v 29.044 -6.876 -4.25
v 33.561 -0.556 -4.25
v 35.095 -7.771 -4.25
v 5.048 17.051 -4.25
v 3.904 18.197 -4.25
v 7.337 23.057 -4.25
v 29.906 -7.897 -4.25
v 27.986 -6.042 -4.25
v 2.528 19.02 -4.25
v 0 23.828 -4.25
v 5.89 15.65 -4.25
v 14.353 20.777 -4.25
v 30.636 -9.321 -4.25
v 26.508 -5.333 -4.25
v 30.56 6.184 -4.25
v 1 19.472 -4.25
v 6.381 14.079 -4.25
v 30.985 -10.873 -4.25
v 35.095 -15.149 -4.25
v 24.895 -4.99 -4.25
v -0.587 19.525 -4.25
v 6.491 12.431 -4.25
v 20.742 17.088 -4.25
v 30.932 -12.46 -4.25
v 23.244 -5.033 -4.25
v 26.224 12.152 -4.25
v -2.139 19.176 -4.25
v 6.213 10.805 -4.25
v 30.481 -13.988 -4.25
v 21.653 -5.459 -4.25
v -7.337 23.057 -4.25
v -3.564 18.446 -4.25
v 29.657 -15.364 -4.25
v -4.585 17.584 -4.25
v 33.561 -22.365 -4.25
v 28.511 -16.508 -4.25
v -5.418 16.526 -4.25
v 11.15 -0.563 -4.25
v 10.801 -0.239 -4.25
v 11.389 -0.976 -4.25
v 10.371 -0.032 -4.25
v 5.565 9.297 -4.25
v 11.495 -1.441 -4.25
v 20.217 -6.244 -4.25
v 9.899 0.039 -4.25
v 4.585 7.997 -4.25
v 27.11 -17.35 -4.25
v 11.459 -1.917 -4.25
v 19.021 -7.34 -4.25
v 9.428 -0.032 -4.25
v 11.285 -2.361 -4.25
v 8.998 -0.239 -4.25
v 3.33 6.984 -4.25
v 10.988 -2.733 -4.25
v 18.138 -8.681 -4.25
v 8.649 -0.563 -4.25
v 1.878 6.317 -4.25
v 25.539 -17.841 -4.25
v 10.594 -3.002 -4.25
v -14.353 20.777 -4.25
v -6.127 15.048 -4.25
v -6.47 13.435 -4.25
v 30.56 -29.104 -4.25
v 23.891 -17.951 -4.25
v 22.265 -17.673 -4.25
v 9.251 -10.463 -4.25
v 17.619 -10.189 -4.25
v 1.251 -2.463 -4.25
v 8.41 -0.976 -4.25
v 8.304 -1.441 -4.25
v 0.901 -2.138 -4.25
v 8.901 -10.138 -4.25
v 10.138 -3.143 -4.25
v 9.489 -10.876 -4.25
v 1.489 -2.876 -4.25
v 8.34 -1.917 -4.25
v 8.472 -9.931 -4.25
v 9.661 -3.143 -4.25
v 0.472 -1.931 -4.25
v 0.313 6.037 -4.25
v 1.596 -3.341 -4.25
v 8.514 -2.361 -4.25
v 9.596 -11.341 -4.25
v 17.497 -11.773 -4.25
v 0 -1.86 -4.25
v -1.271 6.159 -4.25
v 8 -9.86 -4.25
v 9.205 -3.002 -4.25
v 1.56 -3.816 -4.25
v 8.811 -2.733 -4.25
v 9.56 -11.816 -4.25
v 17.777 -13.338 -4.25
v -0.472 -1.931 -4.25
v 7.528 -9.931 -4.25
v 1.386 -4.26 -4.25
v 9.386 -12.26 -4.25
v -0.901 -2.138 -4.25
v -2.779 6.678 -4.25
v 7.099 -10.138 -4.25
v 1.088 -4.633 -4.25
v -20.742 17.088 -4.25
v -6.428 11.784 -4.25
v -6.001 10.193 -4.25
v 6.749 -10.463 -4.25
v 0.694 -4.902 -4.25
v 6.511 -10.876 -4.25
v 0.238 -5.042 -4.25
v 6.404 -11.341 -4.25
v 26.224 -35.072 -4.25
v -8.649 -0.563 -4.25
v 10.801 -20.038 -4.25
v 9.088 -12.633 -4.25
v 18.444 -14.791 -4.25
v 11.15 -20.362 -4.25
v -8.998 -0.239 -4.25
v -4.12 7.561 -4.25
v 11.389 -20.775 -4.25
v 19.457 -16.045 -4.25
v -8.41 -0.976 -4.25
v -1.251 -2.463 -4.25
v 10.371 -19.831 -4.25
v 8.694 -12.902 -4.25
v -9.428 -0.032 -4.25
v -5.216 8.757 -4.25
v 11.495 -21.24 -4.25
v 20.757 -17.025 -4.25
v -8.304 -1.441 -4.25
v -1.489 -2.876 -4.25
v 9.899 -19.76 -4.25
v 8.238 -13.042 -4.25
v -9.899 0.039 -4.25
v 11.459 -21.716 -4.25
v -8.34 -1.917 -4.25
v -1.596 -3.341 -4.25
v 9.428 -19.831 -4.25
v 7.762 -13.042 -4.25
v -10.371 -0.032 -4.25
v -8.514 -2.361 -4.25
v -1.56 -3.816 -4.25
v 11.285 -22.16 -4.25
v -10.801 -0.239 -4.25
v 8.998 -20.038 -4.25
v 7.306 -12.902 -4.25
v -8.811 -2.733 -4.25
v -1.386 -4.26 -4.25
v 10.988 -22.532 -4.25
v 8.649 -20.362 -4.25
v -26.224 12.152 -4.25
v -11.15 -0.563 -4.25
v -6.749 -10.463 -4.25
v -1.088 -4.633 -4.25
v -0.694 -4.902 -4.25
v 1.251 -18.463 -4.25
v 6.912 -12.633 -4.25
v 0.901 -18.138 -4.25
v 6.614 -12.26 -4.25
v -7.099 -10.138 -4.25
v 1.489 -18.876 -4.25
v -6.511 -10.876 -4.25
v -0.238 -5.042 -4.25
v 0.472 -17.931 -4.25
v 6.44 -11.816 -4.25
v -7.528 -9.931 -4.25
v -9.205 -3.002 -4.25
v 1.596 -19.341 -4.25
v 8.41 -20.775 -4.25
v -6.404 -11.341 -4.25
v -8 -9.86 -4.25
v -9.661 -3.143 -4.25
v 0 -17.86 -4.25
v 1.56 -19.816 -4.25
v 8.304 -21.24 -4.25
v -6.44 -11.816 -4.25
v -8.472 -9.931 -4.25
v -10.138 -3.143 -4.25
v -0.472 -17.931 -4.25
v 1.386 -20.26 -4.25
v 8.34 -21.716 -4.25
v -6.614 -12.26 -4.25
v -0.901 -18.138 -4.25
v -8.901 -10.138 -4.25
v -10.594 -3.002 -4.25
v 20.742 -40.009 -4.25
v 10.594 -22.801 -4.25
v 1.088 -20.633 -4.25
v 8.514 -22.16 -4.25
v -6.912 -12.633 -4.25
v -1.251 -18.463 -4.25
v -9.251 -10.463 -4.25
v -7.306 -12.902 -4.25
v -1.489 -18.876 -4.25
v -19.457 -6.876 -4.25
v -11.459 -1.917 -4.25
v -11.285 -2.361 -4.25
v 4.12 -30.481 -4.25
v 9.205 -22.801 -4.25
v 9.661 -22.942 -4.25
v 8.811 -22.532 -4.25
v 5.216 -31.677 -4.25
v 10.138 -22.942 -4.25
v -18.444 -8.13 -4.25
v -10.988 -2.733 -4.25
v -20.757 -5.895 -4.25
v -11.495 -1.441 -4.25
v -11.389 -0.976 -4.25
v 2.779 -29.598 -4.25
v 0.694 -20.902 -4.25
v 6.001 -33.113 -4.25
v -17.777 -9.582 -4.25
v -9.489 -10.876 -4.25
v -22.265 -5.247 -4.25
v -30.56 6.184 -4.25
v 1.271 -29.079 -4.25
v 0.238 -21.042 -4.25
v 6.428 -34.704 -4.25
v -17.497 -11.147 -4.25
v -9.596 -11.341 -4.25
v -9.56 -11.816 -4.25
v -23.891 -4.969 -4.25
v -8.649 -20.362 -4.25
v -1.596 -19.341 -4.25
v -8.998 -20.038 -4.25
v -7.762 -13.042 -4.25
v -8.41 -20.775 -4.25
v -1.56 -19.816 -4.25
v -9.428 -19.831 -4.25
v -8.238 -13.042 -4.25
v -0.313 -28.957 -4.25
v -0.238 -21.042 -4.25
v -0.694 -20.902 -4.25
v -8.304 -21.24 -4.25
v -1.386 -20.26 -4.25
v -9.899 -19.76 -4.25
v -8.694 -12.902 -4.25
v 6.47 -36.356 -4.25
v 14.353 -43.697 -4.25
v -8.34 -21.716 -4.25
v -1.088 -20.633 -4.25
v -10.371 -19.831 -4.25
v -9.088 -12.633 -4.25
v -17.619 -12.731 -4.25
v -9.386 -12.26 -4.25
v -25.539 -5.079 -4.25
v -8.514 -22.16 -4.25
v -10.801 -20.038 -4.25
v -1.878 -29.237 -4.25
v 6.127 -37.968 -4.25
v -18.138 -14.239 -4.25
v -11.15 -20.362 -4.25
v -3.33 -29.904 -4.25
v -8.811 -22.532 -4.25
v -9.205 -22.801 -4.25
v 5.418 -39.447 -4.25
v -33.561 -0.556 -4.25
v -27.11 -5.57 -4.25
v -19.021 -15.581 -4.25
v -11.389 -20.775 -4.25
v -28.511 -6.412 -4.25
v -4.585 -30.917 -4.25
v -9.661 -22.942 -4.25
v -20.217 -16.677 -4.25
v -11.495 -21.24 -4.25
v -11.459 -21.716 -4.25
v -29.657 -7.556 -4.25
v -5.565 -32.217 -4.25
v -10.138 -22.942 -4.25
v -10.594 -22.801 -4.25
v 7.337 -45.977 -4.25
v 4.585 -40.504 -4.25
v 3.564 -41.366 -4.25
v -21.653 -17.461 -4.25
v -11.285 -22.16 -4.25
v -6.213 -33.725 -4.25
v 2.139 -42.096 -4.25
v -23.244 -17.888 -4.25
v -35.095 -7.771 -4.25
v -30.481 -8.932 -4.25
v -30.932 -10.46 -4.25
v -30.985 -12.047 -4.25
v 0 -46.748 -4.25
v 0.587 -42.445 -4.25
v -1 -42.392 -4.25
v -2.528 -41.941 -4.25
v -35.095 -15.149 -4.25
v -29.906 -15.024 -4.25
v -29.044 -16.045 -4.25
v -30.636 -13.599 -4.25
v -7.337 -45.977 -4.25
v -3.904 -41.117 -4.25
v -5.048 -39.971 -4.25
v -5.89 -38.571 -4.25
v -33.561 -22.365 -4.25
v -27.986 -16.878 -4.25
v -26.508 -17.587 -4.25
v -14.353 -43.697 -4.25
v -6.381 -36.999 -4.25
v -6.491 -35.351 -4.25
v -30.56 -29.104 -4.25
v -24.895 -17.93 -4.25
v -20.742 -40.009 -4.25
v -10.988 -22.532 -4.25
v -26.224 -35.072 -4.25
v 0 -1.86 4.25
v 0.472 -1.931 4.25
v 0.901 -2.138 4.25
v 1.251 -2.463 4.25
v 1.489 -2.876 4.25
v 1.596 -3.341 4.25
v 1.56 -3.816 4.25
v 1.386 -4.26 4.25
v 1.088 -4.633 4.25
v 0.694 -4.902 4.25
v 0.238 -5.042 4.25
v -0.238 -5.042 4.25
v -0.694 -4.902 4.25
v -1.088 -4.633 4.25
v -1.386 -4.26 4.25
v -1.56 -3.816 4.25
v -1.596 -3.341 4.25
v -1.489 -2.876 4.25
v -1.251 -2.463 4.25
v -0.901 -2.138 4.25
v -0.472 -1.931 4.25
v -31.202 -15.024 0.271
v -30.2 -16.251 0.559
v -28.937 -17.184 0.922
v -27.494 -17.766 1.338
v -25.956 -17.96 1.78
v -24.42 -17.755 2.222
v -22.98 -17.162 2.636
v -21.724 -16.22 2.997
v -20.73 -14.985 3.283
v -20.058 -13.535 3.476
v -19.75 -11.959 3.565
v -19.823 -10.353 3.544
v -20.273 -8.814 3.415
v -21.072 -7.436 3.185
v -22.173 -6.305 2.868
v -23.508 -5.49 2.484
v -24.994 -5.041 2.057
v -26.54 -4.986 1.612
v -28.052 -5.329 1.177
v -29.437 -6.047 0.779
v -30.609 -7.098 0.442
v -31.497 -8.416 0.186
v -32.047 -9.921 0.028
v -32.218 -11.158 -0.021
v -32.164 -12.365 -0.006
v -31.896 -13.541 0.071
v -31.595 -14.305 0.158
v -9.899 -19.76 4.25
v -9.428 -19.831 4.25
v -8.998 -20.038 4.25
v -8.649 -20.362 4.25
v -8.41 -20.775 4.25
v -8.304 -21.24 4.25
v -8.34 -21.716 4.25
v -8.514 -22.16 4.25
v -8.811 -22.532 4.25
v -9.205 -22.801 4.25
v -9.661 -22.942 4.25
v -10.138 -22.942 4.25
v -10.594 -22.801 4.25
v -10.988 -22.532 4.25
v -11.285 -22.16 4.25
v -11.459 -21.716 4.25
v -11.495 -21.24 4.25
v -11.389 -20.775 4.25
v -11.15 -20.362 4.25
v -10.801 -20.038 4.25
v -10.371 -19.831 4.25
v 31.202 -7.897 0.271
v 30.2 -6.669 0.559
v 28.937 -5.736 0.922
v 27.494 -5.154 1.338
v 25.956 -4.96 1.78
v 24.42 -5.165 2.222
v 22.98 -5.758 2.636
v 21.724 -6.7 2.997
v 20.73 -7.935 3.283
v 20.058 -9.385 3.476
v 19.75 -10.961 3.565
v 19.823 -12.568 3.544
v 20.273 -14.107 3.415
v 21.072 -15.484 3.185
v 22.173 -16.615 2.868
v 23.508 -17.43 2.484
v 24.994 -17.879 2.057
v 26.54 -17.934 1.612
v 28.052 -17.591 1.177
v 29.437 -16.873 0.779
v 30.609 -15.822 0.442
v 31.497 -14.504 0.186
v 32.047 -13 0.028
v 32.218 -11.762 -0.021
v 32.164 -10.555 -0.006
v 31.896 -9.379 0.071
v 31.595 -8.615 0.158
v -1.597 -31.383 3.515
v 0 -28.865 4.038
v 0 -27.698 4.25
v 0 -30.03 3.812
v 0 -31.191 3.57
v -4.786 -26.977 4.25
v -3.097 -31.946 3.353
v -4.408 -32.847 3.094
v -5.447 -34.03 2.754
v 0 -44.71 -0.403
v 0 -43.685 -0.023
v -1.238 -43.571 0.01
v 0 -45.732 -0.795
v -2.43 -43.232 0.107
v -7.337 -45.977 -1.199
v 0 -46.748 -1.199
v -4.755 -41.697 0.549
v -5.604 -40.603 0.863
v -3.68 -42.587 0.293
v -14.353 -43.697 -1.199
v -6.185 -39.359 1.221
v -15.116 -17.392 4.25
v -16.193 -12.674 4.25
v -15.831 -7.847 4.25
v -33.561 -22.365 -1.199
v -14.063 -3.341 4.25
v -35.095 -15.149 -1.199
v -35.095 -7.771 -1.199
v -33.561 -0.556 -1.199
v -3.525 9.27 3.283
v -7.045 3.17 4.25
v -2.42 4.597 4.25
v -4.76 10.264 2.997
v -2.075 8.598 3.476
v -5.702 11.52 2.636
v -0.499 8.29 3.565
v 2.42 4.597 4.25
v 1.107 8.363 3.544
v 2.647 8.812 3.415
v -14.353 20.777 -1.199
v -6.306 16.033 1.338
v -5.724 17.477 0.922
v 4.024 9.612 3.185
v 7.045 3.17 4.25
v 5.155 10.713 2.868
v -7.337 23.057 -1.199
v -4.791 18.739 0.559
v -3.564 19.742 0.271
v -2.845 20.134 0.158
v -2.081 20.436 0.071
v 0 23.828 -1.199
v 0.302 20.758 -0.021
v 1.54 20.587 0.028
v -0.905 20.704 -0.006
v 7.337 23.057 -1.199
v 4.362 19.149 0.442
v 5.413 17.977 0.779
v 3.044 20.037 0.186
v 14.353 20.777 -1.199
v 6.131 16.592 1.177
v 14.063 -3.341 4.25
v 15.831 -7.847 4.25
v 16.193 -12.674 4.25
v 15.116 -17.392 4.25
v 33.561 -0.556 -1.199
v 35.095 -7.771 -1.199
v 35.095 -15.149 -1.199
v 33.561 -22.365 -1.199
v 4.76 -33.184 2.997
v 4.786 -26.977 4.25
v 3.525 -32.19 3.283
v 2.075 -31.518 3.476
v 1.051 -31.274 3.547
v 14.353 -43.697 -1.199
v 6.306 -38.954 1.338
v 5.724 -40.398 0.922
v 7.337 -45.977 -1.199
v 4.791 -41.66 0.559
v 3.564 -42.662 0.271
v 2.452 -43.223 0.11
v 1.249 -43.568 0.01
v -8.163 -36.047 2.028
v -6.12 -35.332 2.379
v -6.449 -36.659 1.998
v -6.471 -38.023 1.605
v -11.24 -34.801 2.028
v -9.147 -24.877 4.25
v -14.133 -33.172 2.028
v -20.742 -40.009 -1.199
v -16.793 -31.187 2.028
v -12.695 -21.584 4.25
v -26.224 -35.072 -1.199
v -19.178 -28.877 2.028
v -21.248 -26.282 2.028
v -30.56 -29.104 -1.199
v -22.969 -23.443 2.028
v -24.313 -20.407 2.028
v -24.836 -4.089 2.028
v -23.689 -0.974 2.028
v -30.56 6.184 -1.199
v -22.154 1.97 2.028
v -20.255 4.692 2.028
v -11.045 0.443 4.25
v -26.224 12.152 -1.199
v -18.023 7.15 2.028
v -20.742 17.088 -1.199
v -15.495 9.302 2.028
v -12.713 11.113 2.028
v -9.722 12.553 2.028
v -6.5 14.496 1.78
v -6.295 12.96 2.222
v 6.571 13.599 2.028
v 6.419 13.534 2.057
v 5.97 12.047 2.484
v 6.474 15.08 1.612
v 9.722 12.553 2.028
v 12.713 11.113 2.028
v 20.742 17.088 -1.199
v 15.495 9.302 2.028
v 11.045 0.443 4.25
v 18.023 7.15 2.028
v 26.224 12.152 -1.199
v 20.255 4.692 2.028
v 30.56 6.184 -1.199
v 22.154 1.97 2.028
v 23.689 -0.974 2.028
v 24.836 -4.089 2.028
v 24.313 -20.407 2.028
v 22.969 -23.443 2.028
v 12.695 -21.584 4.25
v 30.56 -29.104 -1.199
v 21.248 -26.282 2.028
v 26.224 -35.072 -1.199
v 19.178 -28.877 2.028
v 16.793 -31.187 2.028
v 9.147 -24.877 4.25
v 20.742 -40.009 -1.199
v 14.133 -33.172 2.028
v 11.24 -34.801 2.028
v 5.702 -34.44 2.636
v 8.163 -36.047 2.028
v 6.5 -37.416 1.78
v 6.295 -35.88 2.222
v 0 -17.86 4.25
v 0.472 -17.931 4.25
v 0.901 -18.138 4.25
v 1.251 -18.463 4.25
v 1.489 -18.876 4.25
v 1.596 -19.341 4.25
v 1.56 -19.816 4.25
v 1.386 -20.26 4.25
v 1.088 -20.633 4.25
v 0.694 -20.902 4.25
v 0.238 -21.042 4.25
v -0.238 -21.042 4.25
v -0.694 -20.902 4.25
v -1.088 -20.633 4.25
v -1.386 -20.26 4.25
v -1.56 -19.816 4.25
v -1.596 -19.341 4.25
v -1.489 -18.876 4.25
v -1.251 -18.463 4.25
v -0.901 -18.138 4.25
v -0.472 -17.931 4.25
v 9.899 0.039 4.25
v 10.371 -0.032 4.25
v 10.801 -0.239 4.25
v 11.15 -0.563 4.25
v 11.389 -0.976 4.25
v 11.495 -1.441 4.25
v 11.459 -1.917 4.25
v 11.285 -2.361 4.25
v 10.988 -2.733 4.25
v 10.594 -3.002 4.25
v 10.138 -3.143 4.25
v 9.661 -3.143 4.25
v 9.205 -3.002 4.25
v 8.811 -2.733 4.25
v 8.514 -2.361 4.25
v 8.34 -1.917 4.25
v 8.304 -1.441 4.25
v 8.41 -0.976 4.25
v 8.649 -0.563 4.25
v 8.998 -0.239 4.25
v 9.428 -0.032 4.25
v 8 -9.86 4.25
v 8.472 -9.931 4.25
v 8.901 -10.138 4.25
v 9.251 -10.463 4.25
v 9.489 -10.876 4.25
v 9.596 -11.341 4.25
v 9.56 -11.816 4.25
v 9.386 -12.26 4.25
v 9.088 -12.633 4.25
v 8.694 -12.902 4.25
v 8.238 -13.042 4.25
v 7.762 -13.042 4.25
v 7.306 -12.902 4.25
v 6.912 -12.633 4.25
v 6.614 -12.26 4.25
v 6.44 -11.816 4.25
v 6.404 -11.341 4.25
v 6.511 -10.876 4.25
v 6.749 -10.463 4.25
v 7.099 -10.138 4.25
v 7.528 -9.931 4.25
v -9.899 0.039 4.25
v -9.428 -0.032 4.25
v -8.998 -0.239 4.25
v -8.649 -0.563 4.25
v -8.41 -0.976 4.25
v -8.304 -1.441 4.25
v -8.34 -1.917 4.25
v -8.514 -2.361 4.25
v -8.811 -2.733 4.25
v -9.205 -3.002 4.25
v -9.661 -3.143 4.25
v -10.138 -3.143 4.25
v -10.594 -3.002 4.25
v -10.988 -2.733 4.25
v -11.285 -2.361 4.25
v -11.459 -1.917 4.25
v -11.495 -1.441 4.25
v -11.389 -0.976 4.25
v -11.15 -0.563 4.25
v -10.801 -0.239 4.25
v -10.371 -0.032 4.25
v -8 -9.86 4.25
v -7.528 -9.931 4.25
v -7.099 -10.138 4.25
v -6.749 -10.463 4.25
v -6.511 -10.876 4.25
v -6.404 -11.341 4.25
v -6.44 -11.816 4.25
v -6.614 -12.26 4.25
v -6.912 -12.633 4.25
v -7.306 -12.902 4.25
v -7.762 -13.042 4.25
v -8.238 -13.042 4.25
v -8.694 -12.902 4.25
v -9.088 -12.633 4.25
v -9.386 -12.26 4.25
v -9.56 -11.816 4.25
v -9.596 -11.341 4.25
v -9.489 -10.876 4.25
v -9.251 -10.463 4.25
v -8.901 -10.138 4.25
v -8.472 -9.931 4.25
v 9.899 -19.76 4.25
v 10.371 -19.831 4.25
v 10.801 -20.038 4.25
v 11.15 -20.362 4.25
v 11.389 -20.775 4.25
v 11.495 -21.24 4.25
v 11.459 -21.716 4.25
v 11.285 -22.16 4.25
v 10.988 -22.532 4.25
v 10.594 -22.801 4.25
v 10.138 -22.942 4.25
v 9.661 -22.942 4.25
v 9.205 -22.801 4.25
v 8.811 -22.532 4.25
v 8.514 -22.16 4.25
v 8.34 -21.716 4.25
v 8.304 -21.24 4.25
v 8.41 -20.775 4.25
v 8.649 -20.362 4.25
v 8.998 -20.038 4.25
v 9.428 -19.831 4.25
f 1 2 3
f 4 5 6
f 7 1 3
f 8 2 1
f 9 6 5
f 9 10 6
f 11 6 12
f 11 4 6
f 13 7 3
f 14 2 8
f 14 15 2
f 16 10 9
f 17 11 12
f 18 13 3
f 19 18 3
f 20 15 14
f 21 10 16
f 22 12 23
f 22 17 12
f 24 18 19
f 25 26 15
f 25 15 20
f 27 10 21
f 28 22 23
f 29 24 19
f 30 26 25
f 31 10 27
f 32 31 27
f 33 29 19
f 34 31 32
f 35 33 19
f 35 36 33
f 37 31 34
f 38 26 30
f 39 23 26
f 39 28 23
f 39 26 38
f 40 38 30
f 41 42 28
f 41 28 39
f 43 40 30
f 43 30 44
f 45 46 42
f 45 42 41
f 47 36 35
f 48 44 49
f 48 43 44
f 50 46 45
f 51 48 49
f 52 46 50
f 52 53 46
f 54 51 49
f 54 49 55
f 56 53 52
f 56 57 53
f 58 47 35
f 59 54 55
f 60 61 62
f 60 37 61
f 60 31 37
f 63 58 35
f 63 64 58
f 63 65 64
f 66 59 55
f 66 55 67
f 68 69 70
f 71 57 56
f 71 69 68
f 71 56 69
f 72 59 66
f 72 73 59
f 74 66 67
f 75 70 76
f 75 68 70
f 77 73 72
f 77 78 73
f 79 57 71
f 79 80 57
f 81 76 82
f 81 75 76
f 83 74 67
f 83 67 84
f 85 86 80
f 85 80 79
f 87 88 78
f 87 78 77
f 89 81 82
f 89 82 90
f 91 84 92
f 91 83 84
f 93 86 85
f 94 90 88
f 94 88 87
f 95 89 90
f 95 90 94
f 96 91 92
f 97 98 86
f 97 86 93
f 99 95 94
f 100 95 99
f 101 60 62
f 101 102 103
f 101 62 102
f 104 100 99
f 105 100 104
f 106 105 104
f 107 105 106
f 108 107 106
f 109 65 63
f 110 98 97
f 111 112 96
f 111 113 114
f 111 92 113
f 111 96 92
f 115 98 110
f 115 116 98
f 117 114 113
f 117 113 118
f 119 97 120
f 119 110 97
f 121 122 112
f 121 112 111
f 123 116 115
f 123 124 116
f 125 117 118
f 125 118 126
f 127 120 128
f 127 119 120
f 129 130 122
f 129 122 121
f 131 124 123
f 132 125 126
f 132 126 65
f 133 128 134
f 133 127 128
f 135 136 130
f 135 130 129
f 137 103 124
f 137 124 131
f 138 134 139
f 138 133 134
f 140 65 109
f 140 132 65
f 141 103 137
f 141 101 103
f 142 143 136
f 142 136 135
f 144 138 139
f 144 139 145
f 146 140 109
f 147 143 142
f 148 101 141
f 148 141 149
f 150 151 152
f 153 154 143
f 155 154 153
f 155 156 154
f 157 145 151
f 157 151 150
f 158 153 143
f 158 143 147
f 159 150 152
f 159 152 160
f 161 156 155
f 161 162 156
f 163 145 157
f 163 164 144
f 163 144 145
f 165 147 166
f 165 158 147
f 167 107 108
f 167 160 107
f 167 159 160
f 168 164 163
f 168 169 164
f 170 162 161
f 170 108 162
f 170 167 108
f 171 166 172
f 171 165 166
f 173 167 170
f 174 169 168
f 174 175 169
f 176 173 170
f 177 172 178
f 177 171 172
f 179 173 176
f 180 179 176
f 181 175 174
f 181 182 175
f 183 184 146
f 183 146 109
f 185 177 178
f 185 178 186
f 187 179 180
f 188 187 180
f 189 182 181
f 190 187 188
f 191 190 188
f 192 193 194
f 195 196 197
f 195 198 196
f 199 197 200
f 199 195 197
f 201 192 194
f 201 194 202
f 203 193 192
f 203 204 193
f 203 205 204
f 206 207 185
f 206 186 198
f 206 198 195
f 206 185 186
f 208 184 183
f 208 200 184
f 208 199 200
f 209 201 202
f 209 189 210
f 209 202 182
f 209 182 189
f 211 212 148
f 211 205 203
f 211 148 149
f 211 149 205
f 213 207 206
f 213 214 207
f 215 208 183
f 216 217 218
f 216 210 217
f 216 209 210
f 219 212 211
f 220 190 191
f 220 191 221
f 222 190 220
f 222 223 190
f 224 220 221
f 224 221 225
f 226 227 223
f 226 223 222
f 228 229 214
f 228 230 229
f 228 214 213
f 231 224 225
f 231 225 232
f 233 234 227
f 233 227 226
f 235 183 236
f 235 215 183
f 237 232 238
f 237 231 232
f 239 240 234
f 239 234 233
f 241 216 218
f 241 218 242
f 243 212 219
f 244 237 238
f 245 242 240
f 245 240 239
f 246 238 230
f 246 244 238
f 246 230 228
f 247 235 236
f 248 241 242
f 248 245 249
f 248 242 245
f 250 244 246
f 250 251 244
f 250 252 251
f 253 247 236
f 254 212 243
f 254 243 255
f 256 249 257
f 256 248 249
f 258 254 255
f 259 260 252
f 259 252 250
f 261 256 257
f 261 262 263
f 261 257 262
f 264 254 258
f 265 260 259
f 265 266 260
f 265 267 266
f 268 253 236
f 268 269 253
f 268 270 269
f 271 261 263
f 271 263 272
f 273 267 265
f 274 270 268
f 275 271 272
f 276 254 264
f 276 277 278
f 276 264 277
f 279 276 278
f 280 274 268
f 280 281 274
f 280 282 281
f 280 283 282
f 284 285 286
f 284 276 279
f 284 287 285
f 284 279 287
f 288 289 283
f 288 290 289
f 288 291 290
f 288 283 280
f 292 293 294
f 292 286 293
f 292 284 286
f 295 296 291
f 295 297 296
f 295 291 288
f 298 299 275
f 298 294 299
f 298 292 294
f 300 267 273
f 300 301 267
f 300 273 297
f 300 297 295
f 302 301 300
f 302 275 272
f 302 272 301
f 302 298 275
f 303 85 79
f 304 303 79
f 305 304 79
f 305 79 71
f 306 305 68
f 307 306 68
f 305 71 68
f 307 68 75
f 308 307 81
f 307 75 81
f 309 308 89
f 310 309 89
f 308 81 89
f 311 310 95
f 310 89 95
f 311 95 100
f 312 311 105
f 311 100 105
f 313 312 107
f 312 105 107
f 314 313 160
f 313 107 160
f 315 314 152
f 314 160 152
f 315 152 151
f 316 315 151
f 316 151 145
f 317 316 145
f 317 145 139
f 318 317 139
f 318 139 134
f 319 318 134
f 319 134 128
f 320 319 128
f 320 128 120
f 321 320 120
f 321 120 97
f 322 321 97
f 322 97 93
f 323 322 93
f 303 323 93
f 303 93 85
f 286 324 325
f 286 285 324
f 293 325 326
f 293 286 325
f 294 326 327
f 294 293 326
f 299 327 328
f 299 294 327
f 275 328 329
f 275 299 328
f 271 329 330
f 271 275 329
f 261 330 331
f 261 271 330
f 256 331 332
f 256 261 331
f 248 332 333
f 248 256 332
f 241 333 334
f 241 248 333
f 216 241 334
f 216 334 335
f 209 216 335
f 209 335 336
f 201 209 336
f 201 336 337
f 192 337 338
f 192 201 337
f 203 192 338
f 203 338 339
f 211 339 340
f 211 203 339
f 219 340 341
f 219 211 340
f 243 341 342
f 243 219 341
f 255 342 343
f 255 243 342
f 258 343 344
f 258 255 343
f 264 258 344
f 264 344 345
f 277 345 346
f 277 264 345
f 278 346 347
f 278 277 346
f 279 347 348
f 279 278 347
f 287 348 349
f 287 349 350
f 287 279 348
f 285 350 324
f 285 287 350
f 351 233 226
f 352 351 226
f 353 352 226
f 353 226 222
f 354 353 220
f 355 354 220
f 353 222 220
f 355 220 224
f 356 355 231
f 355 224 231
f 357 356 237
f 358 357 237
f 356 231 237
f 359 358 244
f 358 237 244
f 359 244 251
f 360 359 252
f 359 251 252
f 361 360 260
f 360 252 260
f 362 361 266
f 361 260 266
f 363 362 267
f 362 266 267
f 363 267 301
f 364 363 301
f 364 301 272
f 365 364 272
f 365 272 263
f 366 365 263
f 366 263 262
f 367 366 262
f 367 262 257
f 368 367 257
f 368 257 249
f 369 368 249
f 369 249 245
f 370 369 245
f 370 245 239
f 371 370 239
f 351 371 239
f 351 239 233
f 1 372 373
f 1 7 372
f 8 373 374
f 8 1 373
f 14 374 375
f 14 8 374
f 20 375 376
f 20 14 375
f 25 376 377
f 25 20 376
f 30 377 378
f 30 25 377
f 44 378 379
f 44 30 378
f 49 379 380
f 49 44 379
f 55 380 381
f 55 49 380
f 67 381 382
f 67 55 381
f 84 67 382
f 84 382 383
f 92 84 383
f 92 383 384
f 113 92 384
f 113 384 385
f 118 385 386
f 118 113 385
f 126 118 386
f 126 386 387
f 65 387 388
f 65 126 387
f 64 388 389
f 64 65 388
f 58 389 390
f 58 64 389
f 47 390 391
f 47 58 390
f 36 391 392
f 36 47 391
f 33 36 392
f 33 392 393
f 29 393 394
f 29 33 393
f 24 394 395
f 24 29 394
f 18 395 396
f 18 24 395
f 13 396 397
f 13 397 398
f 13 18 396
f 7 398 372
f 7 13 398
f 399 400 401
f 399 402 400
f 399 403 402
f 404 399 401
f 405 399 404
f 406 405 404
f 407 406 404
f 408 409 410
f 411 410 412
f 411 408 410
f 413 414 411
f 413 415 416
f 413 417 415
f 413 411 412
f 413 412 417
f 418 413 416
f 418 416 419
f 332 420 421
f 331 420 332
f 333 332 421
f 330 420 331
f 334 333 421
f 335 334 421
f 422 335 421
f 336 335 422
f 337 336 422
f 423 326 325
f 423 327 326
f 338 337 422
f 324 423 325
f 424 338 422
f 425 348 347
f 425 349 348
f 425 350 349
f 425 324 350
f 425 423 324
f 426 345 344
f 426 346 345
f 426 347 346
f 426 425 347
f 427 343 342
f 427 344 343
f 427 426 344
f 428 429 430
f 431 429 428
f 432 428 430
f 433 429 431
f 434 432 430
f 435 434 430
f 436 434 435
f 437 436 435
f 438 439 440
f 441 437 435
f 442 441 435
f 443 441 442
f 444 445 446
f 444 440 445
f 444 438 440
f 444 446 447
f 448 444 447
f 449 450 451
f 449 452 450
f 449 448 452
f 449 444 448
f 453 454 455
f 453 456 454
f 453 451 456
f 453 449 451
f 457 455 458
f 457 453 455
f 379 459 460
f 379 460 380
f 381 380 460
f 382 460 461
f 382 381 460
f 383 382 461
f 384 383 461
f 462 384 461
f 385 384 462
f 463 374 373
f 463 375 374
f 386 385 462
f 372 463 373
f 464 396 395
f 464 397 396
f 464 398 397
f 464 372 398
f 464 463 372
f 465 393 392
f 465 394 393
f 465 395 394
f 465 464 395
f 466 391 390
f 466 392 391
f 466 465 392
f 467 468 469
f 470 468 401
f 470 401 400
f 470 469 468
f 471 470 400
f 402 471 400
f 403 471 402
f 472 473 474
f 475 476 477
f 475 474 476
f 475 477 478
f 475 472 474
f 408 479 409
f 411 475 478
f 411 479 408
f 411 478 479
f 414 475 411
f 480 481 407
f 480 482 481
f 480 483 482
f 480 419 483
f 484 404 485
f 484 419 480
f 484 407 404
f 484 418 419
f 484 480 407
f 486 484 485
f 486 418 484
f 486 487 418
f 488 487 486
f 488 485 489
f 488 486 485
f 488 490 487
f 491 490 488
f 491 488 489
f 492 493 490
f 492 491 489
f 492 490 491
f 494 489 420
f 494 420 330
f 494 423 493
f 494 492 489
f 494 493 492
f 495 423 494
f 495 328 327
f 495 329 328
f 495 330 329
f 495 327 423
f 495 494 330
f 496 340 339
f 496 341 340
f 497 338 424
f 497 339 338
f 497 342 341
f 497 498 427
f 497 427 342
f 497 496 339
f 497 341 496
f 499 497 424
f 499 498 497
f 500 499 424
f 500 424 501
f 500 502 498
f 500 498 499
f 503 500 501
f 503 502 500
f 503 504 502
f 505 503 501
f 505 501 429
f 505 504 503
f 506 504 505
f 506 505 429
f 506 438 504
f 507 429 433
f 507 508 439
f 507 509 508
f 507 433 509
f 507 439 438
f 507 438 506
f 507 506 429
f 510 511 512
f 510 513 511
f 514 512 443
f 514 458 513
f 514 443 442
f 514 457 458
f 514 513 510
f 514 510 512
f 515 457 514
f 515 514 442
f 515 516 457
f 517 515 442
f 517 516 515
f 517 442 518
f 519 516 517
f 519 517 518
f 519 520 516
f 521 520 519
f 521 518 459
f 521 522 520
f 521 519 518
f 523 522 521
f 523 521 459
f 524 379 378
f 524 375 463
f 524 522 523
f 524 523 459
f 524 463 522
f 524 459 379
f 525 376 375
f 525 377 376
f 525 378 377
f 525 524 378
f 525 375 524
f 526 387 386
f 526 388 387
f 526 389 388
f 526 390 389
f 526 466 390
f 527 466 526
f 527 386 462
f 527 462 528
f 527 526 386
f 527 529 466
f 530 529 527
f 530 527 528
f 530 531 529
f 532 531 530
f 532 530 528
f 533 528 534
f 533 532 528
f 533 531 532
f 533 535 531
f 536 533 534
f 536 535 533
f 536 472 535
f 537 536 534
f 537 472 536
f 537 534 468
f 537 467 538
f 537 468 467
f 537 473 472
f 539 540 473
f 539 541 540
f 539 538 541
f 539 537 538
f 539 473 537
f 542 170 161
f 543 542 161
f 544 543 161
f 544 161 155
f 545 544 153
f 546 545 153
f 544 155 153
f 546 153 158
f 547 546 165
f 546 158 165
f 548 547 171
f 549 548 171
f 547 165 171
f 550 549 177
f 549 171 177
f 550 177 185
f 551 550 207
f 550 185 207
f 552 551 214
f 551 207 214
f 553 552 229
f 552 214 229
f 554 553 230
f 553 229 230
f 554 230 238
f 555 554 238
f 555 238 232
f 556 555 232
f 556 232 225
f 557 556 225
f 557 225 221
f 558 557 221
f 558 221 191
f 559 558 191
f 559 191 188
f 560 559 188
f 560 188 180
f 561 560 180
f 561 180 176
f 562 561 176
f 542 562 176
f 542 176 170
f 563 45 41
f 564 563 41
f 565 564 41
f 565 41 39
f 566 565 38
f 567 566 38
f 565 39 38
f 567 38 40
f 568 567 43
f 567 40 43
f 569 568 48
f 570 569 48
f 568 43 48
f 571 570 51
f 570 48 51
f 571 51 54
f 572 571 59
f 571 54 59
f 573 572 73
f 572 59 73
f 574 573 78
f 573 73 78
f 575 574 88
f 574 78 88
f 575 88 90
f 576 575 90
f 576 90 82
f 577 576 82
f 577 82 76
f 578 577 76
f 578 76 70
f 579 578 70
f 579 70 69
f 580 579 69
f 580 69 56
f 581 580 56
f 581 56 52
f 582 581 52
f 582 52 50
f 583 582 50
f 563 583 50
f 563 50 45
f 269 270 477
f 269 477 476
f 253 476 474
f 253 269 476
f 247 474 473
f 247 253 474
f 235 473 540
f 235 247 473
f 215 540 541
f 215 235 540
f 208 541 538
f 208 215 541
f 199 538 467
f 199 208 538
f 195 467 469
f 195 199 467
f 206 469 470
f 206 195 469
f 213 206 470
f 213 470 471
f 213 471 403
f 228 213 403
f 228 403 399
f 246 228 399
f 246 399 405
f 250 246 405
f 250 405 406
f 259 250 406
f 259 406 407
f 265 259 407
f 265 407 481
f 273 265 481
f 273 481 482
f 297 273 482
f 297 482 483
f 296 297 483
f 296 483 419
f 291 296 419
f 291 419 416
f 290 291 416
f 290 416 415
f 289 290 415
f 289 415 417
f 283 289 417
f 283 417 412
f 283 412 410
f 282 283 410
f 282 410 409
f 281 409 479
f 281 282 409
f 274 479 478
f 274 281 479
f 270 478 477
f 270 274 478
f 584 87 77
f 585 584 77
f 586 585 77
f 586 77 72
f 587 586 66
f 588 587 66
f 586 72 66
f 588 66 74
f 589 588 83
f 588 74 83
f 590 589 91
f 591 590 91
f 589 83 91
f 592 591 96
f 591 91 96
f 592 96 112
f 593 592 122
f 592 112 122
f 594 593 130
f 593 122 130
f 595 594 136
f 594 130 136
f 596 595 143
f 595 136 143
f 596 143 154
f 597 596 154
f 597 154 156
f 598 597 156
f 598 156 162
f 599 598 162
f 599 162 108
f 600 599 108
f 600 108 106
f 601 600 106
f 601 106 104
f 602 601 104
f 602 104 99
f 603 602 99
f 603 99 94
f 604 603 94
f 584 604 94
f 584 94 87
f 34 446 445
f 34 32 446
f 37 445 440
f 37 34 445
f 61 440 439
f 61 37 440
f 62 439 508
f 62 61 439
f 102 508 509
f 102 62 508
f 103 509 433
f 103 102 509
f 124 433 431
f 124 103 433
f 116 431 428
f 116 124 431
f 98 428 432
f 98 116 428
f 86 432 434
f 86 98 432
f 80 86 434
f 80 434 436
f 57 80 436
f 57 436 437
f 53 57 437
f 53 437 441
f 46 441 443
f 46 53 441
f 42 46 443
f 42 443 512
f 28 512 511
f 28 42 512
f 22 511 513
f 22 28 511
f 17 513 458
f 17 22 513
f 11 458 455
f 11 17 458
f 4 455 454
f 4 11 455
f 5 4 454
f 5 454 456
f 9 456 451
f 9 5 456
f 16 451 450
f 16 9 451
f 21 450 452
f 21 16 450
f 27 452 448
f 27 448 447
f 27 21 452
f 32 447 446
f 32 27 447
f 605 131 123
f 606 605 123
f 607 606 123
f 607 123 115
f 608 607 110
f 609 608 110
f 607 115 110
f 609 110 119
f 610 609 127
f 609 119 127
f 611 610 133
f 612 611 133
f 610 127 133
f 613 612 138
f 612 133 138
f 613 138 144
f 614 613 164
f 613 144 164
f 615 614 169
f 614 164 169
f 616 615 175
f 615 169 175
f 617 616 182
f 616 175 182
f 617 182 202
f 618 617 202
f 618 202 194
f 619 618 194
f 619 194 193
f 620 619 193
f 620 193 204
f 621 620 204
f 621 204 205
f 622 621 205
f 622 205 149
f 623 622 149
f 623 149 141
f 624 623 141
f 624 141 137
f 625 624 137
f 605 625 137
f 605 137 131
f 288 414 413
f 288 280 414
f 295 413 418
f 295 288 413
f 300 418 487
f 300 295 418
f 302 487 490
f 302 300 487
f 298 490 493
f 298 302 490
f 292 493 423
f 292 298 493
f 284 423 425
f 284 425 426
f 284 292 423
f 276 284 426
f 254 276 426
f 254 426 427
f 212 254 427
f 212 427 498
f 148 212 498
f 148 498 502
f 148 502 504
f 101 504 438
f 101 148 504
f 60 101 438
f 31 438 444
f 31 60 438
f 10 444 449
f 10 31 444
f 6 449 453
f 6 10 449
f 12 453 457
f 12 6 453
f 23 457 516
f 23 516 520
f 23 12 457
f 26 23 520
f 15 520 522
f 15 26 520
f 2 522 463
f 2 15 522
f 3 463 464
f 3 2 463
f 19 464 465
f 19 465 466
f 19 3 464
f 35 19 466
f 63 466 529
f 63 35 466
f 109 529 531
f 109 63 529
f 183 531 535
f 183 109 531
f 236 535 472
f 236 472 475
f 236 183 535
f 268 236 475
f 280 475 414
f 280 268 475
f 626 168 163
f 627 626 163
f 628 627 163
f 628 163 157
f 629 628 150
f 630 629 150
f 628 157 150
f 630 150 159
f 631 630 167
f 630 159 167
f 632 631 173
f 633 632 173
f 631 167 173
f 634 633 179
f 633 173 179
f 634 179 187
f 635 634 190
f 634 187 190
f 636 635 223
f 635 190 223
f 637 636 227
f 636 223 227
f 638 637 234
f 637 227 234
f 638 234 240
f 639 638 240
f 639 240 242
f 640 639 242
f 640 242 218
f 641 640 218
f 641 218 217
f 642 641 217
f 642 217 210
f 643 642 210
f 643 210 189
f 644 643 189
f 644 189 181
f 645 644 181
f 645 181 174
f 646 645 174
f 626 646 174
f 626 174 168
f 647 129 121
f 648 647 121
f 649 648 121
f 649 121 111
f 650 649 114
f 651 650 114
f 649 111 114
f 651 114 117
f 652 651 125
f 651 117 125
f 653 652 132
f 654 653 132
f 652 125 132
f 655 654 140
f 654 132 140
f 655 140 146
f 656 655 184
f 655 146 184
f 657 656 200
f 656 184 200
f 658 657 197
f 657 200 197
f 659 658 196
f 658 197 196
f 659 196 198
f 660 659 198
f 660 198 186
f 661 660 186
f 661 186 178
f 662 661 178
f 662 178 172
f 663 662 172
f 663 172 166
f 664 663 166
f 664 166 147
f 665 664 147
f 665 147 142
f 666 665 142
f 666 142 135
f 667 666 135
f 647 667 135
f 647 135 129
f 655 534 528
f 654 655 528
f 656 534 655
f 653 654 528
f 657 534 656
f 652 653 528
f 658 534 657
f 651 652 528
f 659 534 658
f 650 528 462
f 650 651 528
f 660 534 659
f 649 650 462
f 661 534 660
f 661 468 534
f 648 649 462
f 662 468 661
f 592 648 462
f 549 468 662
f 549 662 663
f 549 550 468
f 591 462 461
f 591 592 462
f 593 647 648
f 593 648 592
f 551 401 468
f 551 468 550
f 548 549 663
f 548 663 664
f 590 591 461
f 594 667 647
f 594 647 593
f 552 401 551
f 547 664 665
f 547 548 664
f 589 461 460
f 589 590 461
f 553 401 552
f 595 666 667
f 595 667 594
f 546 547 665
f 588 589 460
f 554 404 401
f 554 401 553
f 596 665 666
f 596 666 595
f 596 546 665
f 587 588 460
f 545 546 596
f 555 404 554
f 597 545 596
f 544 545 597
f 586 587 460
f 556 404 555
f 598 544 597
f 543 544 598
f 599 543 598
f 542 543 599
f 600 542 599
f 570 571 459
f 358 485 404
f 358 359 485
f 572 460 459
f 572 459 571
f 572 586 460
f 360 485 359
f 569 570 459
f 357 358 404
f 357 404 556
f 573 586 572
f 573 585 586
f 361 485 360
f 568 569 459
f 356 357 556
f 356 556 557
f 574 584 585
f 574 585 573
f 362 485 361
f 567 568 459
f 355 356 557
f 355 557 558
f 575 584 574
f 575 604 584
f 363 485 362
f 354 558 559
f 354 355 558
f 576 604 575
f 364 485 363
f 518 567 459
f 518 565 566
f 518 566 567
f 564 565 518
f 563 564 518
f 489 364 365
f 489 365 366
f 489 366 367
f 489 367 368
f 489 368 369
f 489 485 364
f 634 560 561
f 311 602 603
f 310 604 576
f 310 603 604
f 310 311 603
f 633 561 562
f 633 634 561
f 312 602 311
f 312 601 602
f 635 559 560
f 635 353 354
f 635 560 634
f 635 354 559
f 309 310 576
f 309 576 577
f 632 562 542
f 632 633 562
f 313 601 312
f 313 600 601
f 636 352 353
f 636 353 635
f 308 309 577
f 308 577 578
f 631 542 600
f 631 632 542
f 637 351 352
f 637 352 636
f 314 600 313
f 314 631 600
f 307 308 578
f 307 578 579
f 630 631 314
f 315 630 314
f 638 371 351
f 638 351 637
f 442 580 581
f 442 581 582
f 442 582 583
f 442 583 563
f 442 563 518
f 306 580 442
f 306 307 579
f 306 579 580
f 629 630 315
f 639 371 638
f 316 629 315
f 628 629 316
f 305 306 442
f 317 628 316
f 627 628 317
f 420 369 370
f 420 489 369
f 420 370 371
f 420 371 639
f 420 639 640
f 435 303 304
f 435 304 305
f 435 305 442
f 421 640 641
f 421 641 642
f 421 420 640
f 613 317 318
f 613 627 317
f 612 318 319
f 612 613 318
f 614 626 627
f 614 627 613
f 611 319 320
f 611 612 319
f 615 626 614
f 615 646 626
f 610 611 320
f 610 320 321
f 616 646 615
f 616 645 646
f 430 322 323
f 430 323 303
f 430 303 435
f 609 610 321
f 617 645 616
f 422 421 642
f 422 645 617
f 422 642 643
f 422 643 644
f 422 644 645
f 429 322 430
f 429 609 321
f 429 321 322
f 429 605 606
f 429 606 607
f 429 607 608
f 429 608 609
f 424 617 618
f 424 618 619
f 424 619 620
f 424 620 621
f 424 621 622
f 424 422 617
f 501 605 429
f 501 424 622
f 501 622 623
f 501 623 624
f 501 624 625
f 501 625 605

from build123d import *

# Parameters (mm, degrees)
PATTERN_CIRCULAR_1_COUNT = 4
SKETCH_3_R               = 1.6
CUT_EXTRUDE_1_DEPTH      = 10
MOVE_BODY_4_ANGLE        = 90


with BuildPart() as part:
    # 草图1 → 旋转1 (revolve)
    with BuildSketch(Plane(origin=(0, 0, 0), x_dir=(0, 0, -1), z_dir=(1, 0, 0)), mode=Mode.PRIVATE) as revolve_1_sk:
        with BuildLine():
            Line((35.2879411, -15.710089558), (0, -15.710089558))
            Line((0, -15.710089558), (0, -7.210089558))
            Line((0, -7.210089558), (16.237996189, -7.210089558))
            ThreePointArc((16.237996189, -7.210089558), (25.906639592, -9.432422882), (35.2879411, -12.6592809))
            Line((35.2879411, -12.6592809), (35.2879411, -15.710089558))
        make_face()
    revolve(revolve_1_sk.sketch.rotate(Axis((0, 31.276946121, 0), (0, -1, 0)), 180), axis=Axis((0, 31.276946121, 0), (0, -1, 0)))

    # 草图2 → 切除-旋转1 (revolve, cut)
    with BuildSketch(Plane(origin=(0, 0, 0), x_dir=(0, 0, -1), z_dir=(1, 0, 0)), mode=Mode.PRIVATE) as cut_revolve_1_sk:
        Polygon((30.059364586, 4.546712214), (36.307565609, 2.755069401), (21.502083986, -48.87778106), (15.253882963, -47.086138247), align=None)
    cut_revolve_1 = revolve(cut_revolve_1_sk.sketch.rotate(Axis((0, -100.021482202, -0.07491734), (0, 0.9612616959383208, -0.27563735581699245)), 33.246351954), axis=Axis((0, -100.021482202, -0.07491734), (0, 0.9612616959383208, -0.27563735581699245)), mode=Mode.SUBTRACT)

    # 阵列(圆周)1: 切除-旋转1 ×4 about axis
    pattern_circular_1_axis = Axis((0, -7.210089558, 0), (0, 1, 0))
    for i in range(1, PATTERN_CIRCULAR_1_COUNT):
        add(cut_revolve_1.rotate(pattern_circular_1_axis, i * 360 / PATTERN_CIRCULAR_1_COUNT), mode=Mode.SUBTRACT)

    # 草图3 → 切除-拉伸1 (cut)
    with BuildSketch(Plane.XZ.offset(15.710089558)):
        with Locations(Location((8, 0, 0), (0, 0, 270))):
            Circle(SKETCH_3_R)
        with Locations(Location((0, 8, 0), (0, 0, 270))):
            Circle(SKETCH_3_R)
        with Locations(Location((0, -8, 0), (0, 0, 270))):
            Circle(SKETCH_3_R)
        with Locations(Location((-8, 0, 0), (0, 0, 270))):
            Circle(SKETCH_3_R)
        with Locations(Location((9.899494937, -9.899494937, 0), (0, 0, 270))):
            Circle(SKETCH_3_R)
        with Locations(Location((-9.899494937, -9.899494937, 0), (0, 0, 270))):
            Circle(SKETCH_3_R)
        with Locations(Location((-9.899494937, 9.899494937, 0), (0, 0, 270))):
            Circle(SKETCH_3_R)
        with Locations(Location((9.899494937, 9.899494937, 0), (0, 0, 270))):
            Circle(SKETCH_3_R)
    extrude(amount=-CUT_EXTRUDE_1_DEPTH, mode=Mode.SUBTRACT)


with BuildPart() as part_1:
    # Move Body 4: moved
    add(part.part.rotate(Axis((0, -11.460089558, 0), (1, 0, 0)), MOVE_BODY_4_ANGLE))


solid = part_1.part
